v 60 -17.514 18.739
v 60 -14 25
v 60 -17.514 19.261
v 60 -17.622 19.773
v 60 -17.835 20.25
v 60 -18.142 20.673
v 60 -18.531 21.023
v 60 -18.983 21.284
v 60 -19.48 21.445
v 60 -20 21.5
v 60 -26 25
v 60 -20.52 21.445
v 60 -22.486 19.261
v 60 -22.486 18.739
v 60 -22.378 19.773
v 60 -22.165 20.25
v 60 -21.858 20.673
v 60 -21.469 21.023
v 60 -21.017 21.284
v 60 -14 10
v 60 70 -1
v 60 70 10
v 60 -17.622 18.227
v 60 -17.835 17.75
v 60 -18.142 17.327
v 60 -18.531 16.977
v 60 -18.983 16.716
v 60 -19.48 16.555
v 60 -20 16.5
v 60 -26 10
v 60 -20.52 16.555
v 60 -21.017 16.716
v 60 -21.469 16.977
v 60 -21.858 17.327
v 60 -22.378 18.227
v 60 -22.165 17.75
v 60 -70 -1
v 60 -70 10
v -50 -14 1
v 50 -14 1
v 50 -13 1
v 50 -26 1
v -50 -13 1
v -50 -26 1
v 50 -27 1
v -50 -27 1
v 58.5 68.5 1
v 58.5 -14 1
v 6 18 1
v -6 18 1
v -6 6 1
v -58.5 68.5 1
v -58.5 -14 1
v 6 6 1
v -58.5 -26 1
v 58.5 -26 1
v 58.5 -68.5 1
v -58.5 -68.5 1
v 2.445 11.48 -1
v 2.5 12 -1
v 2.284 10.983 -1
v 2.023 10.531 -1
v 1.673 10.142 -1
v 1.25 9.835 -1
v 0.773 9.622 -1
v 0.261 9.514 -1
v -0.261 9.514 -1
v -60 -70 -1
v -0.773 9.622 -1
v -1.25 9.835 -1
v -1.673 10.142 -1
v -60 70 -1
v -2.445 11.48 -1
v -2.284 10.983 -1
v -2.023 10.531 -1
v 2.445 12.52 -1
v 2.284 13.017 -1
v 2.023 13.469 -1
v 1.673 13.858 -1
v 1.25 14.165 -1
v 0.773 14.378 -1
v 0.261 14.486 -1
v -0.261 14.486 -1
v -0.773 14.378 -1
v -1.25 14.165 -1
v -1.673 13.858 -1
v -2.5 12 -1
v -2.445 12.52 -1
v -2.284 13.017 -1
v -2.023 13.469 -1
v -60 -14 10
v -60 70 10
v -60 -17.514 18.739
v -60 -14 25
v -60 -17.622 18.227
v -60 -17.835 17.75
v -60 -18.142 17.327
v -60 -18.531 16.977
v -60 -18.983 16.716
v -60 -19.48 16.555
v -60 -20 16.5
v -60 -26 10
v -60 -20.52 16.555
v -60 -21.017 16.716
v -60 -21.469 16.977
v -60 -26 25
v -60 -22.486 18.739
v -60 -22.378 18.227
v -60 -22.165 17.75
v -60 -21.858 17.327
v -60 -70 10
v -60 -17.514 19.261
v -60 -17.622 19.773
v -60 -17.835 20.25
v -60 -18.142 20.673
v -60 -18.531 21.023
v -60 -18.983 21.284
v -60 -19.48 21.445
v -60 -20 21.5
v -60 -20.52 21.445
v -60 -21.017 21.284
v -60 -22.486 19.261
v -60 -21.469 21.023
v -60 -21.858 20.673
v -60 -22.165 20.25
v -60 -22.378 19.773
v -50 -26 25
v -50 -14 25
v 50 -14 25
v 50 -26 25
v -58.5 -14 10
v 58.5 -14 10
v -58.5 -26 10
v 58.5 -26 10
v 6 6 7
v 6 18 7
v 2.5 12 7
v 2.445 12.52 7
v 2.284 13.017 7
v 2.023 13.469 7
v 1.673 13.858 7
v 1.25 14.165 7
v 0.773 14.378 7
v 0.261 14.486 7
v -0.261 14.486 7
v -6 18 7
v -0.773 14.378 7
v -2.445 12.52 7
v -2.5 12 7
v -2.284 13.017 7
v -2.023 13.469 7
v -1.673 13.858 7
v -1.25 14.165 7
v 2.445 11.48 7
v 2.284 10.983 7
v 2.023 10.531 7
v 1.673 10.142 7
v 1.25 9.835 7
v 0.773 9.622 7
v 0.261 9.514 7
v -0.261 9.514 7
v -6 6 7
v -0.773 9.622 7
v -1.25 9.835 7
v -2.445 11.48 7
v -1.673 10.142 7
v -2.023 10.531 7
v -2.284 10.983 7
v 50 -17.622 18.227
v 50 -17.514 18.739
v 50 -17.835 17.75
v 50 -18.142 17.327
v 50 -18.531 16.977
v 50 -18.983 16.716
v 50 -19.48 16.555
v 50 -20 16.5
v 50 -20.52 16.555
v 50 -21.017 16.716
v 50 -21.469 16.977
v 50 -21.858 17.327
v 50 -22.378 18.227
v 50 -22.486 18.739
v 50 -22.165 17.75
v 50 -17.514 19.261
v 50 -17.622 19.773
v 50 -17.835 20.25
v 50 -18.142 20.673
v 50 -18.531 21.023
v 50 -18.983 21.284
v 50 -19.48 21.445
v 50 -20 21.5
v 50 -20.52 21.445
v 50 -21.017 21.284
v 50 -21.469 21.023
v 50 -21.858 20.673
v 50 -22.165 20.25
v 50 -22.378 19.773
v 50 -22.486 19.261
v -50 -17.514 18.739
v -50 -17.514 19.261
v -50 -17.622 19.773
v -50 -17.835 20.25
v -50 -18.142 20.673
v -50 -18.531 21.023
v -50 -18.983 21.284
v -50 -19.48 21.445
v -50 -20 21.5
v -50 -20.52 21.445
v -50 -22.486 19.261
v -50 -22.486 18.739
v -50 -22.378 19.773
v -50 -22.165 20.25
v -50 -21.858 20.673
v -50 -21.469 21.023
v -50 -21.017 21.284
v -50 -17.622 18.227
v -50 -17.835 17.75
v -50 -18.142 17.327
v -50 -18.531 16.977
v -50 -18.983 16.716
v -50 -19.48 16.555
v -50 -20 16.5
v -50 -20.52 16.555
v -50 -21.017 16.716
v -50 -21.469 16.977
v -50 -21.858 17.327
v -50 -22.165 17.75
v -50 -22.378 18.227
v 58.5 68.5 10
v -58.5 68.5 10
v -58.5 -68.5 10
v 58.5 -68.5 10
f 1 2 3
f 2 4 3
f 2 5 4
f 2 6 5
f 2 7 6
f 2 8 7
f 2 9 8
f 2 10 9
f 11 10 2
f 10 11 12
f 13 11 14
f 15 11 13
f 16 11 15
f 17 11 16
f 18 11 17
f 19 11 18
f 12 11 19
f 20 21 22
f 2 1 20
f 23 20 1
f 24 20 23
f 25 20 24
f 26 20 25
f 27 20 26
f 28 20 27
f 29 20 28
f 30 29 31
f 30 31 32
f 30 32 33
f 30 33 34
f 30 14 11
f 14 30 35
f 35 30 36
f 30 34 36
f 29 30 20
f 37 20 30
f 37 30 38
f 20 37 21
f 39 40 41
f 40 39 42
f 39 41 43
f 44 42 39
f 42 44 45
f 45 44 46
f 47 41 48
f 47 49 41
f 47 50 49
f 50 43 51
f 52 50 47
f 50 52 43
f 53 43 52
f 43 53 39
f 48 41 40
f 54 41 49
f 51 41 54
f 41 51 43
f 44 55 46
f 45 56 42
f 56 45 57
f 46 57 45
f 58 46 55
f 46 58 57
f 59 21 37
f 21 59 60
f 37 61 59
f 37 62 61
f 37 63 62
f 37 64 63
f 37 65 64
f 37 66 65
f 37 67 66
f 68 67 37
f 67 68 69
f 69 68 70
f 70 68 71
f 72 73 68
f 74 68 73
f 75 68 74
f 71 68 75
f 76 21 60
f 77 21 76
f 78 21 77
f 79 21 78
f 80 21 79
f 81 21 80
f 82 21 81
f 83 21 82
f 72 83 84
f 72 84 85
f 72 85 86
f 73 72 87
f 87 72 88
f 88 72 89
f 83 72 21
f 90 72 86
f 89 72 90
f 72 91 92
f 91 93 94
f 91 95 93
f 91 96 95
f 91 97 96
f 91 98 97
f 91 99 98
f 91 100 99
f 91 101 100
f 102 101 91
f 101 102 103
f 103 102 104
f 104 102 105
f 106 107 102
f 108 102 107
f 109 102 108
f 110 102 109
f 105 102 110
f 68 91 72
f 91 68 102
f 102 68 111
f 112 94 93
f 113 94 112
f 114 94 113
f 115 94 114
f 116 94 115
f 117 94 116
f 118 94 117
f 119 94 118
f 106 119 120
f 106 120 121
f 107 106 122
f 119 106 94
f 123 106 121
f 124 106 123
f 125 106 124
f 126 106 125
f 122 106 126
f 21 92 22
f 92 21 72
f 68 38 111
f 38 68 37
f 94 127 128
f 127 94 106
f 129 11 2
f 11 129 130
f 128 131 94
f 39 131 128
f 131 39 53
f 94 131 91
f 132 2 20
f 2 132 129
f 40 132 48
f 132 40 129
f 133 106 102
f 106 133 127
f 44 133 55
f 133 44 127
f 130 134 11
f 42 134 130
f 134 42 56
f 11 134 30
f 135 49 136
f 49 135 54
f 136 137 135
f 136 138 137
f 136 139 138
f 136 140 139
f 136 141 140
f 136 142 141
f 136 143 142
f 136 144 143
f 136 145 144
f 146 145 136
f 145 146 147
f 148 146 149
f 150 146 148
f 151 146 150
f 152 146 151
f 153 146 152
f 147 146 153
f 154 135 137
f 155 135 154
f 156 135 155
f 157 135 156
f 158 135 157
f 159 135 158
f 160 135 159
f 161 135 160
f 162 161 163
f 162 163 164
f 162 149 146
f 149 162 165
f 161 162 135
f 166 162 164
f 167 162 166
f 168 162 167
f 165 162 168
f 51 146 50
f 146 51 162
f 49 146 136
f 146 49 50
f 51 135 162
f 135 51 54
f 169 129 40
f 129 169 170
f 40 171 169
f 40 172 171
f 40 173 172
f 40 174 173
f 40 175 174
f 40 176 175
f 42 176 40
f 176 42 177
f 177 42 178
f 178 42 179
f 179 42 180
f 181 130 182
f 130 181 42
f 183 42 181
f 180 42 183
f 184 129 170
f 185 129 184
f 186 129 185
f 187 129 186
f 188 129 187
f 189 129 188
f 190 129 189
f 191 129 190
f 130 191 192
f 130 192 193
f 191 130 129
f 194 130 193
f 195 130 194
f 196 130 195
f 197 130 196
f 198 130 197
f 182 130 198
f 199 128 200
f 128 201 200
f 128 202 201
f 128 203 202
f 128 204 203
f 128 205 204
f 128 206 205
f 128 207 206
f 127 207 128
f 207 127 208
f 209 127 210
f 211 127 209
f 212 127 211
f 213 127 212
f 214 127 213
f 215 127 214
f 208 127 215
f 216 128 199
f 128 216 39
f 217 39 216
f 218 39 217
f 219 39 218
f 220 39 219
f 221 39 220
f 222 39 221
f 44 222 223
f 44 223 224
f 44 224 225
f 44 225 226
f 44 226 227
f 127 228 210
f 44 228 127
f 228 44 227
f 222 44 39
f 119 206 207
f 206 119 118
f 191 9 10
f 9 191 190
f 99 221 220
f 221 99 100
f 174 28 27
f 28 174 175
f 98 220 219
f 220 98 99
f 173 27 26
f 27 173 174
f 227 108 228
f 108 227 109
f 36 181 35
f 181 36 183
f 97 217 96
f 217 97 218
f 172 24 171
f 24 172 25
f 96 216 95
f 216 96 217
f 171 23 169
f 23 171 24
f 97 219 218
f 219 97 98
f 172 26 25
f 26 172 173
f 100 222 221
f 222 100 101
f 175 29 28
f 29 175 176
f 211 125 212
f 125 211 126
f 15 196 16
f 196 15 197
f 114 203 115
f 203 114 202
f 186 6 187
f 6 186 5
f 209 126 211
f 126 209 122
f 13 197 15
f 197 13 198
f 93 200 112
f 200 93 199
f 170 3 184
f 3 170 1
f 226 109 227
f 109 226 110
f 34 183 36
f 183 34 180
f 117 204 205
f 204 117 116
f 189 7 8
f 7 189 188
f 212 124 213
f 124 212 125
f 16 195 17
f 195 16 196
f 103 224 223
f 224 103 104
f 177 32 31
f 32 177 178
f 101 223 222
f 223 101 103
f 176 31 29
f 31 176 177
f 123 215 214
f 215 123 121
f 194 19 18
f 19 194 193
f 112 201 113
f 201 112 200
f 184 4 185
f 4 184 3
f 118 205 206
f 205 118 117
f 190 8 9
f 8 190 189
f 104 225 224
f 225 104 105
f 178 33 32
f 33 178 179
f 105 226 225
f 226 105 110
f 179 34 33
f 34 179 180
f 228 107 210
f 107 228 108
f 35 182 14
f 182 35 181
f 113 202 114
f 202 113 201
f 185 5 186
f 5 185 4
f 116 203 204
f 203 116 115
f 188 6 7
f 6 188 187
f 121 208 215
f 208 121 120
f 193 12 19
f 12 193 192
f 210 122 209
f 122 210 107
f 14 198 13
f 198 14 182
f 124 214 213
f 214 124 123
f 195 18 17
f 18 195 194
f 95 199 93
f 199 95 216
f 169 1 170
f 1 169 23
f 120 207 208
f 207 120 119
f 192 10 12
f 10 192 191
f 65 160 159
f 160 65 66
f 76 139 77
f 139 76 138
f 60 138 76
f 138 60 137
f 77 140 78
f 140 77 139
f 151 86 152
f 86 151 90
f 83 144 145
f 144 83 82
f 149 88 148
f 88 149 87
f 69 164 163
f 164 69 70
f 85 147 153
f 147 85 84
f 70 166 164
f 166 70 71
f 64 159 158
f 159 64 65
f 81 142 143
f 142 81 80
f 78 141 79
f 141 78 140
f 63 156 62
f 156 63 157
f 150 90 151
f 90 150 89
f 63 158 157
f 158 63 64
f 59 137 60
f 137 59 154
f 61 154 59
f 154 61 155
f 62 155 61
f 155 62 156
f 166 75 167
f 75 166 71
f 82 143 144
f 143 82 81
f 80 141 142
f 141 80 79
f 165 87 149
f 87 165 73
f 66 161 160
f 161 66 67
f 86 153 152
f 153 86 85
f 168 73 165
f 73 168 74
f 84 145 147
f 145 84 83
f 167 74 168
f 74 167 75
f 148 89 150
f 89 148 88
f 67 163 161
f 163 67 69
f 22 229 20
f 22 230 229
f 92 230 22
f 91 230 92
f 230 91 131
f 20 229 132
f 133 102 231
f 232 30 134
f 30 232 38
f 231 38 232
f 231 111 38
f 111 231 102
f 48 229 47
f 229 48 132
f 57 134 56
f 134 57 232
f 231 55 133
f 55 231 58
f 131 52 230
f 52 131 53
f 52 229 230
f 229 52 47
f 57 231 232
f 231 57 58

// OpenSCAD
$fn=30;

difference(){

union(){
cube([120,140,2],center=true);
translate([0,-20,13])
cube([120,12,24],center=true);
translate([0,12,4])
cube([12,12,6],center=true);
}

translate([0,-20,15])
cube([100,14,28],center=true);
translate([0,-20,19])rotate([0,90,0])
cylinder(d=5,h=122,center=true);
translate([0,12,7])
cylinder(d=5,h=20,center=true);
}

translate([0,0,5])
difference(){
cube([120,140,10],center=true);
cube([117,137,22],center=true);
} 
